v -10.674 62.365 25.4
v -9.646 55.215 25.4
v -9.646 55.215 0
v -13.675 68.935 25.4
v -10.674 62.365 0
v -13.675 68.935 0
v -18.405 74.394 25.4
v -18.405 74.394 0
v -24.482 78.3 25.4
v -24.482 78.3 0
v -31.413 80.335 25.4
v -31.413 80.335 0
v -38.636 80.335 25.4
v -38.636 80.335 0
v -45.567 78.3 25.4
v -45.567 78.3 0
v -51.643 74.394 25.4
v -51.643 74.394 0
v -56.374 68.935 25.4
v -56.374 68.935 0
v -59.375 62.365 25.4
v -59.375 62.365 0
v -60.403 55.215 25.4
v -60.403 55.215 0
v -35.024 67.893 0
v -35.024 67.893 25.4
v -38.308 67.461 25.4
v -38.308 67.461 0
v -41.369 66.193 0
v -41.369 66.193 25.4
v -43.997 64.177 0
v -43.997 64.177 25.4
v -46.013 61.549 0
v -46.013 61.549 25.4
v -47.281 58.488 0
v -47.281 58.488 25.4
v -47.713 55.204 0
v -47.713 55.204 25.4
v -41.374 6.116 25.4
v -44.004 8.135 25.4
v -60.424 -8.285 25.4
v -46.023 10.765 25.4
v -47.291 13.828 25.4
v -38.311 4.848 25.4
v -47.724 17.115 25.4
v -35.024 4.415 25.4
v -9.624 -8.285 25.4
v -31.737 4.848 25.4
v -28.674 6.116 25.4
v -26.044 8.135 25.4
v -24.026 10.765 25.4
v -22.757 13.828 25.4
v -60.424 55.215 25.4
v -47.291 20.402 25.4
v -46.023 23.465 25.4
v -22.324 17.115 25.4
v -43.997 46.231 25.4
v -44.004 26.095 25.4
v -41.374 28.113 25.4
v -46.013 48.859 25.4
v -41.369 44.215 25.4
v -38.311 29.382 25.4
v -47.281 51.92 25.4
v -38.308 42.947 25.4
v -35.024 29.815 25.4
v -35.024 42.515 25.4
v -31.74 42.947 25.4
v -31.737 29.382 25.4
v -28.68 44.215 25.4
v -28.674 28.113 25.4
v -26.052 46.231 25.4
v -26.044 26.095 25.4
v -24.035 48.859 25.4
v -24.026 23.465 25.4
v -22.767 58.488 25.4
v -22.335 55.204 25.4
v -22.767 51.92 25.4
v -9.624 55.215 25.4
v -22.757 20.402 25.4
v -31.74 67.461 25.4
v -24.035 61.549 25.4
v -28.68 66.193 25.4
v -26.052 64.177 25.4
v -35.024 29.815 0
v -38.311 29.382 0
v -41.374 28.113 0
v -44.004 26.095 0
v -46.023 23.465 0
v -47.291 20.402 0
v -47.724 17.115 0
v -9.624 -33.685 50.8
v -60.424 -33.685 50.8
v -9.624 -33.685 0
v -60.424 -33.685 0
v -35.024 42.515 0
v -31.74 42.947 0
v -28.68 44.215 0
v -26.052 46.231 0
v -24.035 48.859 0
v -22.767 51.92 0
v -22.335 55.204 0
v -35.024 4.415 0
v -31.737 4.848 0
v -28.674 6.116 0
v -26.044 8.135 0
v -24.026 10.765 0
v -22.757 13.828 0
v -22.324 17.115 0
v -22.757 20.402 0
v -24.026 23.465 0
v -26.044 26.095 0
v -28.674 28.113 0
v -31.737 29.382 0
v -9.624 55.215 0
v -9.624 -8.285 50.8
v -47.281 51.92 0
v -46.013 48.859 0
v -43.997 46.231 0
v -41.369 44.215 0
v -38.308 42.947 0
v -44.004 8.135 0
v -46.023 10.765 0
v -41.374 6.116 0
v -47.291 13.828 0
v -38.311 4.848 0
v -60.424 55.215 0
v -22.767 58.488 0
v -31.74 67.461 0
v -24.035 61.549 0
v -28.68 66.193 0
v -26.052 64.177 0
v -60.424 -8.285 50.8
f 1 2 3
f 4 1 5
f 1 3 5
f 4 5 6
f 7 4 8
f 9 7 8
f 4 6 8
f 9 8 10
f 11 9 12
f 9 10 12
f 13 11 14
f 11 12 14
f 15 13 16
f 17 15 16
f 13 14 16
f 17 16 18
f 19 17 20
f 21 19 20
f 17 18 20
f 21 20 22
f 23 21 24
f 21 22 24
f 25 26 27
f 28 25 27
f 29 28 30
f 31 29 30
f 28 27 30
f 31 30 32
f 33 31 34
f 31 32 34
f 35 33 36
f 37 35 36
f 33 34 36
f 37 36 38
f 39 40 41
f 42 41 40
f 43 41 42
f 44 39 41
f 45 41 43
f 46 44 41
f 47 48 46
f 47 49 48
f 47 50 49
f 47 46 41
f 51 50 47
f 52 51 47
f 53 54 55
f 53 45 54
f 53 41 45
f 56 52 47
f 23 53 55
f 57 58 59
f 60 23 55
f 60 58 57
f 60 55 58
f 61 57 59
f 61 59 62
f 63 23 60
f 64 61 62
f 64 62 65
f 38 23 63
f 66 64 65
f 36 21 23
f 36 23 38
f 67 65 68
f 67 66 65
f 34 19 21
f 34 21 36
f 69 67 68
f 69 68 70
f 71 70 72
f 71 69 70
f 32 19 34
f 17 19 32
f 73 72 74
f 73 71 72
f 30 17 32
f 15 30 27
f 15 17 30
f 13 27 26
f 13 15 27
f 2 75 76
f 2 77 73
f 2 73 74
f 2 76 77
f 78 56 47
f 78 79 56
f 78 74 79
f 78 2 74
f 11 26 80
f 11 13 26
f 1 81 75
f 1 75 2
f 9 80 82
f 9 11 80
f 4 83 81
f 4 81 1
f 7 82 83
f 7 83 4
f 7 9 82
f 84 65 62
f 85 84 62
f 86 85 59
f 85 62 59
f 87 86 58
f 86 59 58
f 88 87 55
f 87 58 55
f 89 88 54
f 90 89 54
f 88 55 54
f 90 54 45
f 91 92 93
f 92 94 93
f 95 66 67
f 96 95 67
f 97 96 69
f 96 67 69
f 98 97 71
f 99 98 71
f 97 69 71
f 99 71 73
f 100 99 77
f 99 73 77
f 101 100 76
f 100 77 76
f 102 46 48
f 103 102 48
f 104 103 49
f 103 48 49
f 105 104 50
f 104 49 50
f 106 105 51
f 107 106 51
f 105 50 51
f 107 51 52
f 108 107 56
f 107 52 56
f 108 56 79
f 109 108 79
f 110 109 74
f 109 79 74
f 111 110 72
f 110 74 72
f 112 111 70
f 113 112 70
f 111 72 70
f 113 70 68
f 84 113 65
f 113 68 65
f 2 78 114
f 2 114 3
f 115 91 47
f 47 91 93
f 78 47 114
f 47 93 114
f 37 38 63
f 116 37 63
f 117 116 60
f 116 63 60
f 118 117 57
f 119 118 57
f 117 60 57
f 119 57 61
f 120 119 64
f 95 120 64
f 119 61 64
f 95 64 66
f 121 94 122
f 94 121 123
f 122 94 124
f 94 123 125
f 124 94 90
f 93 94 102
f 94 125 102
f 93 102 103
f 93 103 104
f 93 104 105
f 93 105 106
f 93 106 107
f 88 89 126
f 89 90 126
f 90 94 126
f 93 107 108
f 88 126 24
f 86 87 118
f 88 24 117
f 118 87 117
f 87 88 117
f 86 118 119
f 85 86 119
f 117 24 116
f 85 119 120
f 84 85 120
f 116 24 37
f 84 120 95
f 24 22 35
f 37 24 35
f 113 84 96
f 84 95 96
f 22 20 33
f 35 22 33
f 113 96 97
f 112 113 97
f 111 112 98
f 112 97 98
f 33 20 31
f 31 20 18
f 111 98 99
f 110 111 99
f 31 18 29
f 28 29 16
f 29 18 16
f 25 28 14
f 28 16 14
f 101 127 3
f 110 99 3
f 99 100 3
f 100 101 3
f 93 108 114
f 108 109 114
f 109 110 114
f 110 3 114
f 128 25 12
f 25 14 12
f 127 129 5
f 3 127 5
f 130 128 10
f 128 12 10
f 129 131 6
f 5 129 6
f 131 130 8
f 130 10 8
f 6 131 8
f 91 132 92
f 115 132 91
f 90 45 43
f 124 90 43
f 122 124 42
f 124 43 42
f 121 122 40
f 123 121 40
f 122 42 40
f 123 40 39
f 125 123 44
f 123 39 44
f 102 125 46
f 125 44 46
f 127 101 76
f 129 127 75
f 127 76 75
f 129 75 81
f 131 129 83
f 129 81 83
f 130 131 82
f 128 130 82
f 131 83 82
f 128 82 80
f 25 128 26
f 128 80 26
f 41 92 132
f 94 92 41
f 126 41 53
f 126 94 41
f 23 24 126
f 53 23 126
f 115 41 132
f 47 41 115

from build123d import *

# Parameters (mm, degrees)
F1_DEPTH = 25.4
F2_W     = 50.8
F2_H     = 25.4
F3_DEPTH = 25.4
F5_DEPTH = 25.4


with BuildPart() as f1:
    # F0 (on Top) → F1 (new body)
    with BuildSketch(Plane.XY):
        with BuildLine():
            Line((-60.40253, 55.21483), (-60.424231, 55.21483))
            Line((-60.424231, 55.21483), (-60.424231, -33.68517))
            Line((-60.424231, -33.68517), (-9.624231, -33.68517))
            Line((-9.624231, -33.68517), (-9.624231, 55.21483))
            Line((-9.624231, 55.21483), (-9.645933, 55.21483))
            ThreePointArc((-9.645933, 55.21483), (-35.024231, 80.593129), (-60.40253, 55.21483))
        make_face()
    extrude(amount=F1_DEPTH)

    # F2 (on face) → F3 (join)
    with BuildSketch(Plane.XY.offset(25.4)):
        with Locations((-35.024231, -20.98517)):
            Rectangle(F2_W, F2_H)
    extrude(amount=F3_DEPTH)

    # F4 (on face) → F5 (cut)
    with BuildSketch(Plane.XY.offset(25.4)):
        with BuildLine():
            Line((-35.024231, 17.11483), (-22.324231, 17.11483))
            ThreePointArc((-22.324231, 17.11483), (-26.043975, 26.095086), (-35.024231, 29.81483))
            Line((-35.024231, 29.81483), (-35.024231, 17.11483))
        make_face()
        with BuildLine():
            ThreePointArc((-35.024231, 4.41483), (-26.043975, 8.134574), (-22.324231, 17.11483))
            Line((-22.324231, 17.11483), (-35.024231, 17.11483))
            Line((-35.024231, 17.11483), (-35.024231, 4.41483))
        make_face()
        with BuildLine():
            Line((-35.024231, 17.11483), (-35.024231, 29.81483))
            ThreePointArc((-35.024231, 29.81483), (-44.004487, 26.095086), (-47.724231, 17.11483))
            Line((-47.724231, 17.11483), (-35.024231, 17.11483))
        make_face()
        with BuildLine():
            ThreePointArc((-47.724231, 17.11483), (-44.004487, 8.134574), (-35.024231, 4.41483))
            Line((-35.024231, 4.41483), (-35.024231, 17.11483))
            Line((-35.024231, 17.11483), (-47.724231, 17.11483))
        make_face()
        with BuildLine():
            Line((-35.024231, 55.203979), (-22.335082, 55.203979))
            ThreePointArc((-22.335082, 55.203979), (-26.051648, 64.176563), (-35.024231, 67.893129))
            Line((-35.024231, 67.893129), (-35.024231, 55.203979))
        make_face()
        with BuildLine():
            ThreePointArc((-35.024231, 42.51483), (-26.051648, 46.231396), (-22.335082, 55.203979))
            Line((-22.335082, 55.203979), (-35.024231, 55.203979))
            Line((-35.024231, 55.203979), (-35.024231, 42.51483))
        make_face()
        with BuildLine():
            Line((-35.024231, 55.203979), (-35.024231, 67.893129))
            ThreePointArc((-35.024231, 67.893129), (-43.996815, 64.176563), (-47.713381, 55.203979))
            Line((-47.713381, 55.203979), (-35.024231, 55.203979))
        make_face()
        with BuildLine():
            ThreePointArc((-47.713381, 55.203979), (-43.996815, 46.231396), (-35.024231, 42.51483))
            Line((-35.024231, 42.51483), (-35.024231, 55.203979))
            Line((-35.024231, 55.203979), (-47.713381, 55.203979))
        make_face()
    extrude(amount=-F5_DEPTH, mode=Mode.SUBTRACT)


solid = f1.part
